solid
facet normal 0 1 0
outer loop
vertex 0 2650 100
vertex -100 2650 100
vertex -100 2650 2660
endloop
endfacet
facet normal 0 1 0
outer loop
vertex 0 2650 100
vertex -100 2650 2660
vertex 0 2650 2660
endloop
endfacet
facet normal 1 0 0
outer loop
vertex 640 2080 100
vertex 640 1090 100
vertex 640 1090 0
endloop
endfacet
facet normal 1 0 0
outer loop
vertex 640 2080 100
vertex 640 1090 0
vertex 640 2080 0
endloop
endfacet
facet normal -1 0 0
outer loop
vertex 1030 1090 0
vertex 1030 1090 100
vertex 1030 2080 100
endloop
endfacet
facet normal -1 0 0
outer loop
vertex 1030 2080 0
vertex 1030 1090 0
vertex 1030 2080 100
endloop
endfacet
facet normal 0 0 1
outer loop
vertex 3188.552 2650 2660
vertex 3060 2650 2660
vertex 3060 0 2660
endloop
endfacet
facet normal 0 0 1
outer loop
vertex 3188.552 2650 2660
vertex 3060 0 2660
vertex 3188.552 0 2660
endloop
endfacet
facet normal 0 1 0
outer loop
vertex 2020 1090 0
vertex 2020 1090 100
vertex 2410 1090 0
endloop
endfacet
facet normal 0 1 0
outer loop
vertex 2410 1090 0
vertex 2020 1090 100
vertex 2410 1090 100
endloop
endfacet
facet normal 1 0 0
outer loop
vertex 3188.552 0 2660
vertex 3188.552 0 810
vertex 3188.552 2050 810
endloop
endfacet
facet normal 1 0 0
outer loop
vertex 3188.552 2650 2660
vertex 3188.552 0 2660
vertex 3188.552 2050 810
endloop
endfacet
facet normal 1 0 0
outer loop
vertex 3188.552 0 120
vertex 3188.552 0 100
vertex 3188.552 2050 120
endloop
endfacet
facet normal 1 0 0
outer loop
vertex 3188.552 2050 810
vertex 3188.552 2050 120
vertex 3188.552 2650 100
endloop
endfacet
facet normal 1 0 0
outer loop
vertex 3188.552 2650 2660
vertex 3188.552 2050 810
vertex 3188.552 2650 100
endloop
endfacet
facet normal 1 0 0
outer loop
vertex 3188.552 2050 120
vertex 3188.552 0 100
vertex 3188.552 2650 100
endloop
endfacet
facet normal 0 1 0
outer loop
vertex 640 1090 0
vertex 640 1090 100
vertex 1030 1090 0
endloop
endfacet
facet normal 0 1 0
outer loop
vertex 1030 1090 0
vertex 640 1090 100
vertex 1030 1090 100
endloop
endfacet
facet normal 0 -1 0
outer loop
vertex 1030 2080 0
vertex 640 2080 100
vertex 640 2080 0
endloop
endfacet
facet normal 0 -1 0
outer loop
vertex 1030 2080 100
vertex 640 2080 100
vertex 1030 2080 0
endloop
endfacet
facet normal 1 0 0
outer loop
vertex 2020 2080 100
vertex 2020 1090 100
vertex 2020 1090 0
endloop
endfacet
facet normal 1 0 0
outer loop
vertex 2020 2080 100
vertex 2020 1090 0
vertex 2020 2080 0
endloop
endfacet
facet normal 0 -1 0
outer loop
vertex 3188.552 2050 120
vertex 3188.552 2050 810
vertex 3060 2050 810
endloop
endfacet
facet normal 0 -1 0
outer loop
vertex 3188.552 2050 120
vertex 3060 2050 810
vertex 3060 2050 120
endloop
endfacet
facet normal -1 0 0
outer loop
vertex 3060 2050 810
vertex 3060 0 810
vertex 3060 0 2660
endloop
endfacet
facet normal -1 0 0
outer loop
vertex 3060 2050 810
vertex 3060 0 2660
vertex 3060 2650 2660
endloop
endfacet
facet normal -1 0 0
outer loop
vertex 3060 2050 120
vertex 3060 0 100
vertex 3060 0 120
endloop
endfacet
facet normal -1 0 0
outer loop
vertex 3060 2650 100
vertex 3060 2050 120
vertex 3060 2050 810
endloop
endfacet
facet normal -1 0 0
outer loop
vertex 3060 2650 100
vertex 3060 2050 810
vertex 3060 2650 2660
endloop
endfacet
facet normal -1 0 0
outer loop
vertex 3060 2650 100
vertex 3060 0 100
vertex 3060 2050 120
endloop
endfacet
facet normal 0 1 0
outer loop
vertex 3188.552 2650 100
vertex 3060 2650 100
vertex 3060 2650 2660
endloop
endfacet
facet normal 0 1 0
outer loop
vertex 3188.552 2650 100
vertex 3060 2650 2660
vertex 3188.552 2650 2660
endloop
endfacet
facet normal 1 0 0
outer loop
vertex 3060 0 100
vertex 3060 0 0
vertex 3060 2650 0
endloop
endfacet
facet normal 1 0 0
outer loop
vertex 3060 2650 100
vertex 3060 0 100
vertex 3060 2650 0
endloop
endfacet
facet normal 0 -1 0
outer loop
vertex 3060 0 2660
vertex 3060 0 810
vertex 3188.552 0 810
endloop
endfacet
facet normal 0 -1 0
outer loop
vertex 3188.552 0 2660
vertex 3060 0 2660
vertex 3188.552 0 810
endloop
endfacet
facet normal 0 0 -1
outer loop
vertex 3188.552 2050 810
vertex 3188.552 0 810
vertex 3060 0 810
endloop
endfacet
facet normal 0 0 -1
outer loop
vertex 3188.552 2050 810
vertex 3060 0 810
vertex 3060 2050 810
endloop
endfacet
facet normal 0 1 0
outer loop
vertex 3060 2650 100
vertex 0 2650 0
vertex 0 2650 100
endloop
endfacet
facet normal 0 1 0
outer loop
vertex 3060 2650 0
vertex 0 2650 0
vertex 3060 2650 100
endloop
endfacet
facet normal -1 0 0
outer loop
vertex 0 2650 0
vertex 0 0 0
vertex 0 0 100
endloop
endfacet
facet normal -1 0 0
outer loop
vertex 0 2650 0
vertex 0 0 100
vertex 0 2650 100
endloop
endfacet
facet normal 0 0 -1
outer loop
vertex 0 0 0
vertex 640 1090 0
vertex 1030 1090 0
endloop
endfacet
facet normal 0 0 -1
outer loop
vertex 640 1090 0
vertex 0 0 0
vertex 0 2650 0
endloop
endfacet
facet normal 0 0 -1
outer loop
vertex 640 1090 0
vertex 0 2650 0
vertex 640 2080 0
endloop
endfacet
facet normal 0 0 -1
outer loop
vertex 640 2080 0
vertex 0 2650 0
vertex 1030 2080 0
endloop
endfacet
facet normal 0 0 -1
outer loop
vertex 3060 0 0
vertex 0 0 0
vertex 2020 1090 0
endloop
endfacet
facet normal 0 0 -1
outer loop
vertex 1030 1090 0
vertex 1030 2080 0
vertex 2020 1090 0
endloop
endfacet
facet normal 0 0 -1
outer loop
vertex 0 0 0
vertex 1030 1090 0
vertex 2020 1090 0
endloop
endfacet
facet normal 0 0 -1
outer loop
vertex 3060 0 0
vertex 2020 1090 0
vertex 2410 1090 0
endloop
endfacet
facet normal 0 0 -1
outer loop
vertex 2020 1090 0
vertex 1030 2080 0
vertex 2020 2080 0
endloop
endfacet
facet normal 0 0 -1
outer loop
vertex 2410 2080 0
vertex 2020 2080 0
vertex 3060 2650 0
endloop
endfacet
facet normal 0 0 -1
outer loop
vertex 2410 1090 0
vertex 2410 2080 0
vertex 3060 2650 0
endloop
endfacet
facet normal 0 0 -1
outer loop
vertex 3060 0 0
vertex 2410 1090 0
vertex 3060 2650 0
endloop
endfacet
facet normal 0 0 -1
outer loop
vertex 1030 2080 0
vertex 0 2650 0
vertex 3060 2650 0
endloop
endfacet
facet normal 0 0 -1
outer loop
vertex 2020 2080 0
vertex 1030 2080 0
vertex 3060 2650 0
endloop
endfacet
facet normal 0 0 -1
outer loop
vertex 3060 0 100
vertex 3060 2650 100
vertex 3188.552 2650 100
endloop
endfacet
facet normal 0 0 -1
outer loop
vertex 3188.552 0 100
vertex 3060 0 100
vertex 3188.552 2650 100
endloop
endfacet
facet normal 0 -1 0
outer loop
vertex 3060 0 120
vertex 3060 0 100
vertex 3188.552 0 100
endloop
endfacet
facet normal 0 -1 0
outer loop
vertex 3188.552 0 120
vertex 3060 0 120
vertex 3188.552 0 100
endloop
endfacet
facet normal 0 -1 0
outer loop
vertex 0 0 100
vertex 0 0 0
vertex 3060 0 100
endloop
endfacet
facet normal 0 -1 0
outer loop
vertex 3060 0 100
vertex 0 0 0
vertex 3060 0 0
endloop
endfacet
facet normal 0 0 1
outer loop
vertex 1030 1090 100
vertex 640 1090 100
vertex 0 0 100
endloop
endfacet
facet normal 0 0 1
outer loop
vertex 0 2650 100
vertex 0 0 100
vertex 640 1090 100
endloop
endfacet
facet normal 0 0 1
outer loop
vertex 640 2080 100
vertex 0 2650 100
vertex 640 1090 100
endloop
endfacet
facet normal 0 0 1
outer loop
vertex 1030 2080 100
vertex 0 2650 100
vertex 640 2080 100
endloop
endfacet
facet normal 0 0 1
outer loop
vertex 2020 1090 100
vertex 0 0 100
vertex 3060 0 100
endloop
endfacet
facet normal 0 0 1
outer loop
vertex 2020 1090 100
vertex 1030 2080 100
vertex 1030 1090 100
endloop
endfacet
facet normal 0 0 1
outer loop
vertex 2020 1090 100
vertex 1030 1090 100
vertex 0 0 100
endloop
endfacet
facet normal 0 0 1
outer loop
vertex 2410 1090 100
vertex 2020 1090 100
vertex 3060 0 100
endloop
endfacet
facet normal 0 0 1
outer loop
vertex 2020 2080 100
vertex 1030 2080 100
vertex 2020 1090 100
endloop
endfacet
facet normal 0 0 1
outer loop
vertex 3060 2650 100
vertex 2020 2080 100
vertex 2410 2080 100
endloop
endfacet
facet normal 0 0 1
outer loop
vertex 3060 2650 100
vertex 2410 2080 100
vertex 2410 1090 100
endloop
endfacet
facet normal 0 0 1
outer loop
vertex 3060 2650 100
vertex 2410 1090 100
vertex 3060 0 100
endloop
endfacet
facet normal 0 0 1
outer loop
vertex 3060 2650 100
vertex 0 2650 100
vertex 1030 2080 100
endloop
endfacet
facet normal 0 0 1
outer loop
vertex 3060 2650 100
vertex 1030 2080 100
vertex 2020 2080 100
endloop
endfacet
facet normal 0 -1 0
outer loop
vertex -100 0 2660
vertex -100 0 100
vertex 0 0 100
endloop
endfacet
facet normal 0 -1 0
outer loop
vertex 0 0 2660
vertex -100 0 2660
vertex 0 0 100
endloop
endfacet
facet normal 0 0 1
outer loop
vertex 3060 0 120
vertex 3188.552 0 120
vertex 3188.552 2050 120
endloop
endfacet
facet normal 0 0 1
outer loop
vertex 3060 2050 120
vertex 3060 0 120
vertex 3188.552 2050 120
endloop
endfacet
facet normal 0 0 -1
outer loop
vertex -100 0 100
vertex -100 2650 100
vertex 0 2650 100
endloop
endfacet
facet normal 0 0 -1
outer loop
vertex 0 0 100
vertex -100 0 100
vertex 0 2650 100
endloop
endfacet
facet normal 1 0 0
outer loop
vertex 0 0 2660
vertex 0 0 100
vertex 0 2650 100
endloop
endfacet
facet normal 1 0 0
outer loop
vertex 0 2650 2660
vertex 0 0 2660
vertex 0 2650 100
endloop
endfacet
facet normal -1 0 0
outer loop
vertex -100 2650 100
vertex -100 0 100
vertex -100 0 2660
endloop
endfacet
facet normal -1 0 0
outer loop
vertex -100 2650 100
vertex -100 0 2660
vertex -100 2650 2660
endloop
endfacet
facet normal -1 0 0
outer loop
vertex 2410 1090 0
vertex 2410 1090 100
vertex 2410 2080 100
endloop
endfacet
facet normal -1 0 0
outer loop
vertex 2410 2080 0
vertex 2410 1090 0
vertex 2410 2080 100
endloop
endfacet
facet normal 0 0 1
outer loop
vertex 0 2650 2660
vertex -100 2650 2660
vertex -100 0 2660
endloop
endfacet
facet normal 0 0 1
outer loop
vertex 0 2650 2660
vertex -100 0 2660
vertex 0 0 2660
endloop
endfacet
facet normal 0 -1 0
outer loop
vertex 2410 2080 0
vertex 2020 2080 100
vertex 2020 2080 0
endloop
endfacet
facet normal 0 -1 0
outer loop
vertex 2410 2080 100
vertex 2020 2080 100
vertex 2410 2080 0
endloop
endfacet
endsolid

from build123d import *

# Parameters (mm, degrees)
ESBO_O6_W                = 3060
ESBO_O6_H                = 2650
RESSALTO_EXTRUS_O2_DEPTH = 100
ESBO_O7_W                = 390
ESBO_O7_H                = 990
CORTE_EXTRUS_O1_DEPTH    = 749
ESBO_O8_W                = 100
ESBO_O8_H                = 2650
RESSALTO_EXTRUS_O3_DEPTH = 2560
ESBO_O9_W                = 128.55153638
ESBO_O9_H                = 2650
RESSALTO_EXTRUS_O4_DEPTH = 2560
ESBO_O12_W               = 690
ESBO_O12_H               = 2050
CORTE_EXTRUS_O2_DEPTH    = 1050


with BuildPart() as part:
    # Esboço6 → Ressalto-extrusão2 (new body)
    with BuildSketch(Plane.XY):
        with Locations((1530, 1325)):
            Rectangle(ESBO_O6_W, ESBO_O6_H)
    extrude(amount=RESSALTO_EXTRUS_O2_DEPTH)

    # Esboço7 → Corte-extrusão1 (cut)
    with BuildSketch(Plane.XY.offset(100)):
        with Locations((2215, 1585)):
            Rectangle(ESBO_O7_W, ESBO_O7_H)
        with Locations((835, 1585)):
            Rectangle(ESBO_O7_W, ESBO_O7_H)
    extrude(amount=-CORTE_EXTRUS_O1_DEPTH, mode=Mode.SUBTRACT)


with BuildPart() as body_2:
    # Esboço8 → Ressalto-extrusão3 (new body)
    with BuildSketch(Plane.XY.offset(100)):
        with Locations((-50, 1325)):
            Rectangle(ESBO_O8_W, ESBO_O8_H)
    extrude(amount=RESSALTO_EXTRUS_O3_DEPTH)


with BuildPart() as body_3:
    # Esboço9 → Ressalto-extrusão4 (new body)
    with BuildSketch(Plane.XY.offset(100)):
        with Locations((3124.27576819, 1325)):
            Rectangle(ESBO_O9_W, ESBO_O9_H)
    extrude(amount=RESSALTO_EXTRUS_O4_DEPTH)

    # Esboço12 → Corte-extrusão2 (cut)
    with BuildSketch(Plane(origin=(3188.55153638, 0, 0), x_dir=(0, 0, -1), z_dir=(1, 0, 0))):
        with Locations((-465, 1025)):
            Rectangle(ESBO_O12_W, ESBO_O12_H)
    extrude(amount=-CORTE_EXTRUS_O2_DEPTH, mode=Mode.SUBTRACT)


solid = Compound([part.part, body_2.part, body_3.part])
